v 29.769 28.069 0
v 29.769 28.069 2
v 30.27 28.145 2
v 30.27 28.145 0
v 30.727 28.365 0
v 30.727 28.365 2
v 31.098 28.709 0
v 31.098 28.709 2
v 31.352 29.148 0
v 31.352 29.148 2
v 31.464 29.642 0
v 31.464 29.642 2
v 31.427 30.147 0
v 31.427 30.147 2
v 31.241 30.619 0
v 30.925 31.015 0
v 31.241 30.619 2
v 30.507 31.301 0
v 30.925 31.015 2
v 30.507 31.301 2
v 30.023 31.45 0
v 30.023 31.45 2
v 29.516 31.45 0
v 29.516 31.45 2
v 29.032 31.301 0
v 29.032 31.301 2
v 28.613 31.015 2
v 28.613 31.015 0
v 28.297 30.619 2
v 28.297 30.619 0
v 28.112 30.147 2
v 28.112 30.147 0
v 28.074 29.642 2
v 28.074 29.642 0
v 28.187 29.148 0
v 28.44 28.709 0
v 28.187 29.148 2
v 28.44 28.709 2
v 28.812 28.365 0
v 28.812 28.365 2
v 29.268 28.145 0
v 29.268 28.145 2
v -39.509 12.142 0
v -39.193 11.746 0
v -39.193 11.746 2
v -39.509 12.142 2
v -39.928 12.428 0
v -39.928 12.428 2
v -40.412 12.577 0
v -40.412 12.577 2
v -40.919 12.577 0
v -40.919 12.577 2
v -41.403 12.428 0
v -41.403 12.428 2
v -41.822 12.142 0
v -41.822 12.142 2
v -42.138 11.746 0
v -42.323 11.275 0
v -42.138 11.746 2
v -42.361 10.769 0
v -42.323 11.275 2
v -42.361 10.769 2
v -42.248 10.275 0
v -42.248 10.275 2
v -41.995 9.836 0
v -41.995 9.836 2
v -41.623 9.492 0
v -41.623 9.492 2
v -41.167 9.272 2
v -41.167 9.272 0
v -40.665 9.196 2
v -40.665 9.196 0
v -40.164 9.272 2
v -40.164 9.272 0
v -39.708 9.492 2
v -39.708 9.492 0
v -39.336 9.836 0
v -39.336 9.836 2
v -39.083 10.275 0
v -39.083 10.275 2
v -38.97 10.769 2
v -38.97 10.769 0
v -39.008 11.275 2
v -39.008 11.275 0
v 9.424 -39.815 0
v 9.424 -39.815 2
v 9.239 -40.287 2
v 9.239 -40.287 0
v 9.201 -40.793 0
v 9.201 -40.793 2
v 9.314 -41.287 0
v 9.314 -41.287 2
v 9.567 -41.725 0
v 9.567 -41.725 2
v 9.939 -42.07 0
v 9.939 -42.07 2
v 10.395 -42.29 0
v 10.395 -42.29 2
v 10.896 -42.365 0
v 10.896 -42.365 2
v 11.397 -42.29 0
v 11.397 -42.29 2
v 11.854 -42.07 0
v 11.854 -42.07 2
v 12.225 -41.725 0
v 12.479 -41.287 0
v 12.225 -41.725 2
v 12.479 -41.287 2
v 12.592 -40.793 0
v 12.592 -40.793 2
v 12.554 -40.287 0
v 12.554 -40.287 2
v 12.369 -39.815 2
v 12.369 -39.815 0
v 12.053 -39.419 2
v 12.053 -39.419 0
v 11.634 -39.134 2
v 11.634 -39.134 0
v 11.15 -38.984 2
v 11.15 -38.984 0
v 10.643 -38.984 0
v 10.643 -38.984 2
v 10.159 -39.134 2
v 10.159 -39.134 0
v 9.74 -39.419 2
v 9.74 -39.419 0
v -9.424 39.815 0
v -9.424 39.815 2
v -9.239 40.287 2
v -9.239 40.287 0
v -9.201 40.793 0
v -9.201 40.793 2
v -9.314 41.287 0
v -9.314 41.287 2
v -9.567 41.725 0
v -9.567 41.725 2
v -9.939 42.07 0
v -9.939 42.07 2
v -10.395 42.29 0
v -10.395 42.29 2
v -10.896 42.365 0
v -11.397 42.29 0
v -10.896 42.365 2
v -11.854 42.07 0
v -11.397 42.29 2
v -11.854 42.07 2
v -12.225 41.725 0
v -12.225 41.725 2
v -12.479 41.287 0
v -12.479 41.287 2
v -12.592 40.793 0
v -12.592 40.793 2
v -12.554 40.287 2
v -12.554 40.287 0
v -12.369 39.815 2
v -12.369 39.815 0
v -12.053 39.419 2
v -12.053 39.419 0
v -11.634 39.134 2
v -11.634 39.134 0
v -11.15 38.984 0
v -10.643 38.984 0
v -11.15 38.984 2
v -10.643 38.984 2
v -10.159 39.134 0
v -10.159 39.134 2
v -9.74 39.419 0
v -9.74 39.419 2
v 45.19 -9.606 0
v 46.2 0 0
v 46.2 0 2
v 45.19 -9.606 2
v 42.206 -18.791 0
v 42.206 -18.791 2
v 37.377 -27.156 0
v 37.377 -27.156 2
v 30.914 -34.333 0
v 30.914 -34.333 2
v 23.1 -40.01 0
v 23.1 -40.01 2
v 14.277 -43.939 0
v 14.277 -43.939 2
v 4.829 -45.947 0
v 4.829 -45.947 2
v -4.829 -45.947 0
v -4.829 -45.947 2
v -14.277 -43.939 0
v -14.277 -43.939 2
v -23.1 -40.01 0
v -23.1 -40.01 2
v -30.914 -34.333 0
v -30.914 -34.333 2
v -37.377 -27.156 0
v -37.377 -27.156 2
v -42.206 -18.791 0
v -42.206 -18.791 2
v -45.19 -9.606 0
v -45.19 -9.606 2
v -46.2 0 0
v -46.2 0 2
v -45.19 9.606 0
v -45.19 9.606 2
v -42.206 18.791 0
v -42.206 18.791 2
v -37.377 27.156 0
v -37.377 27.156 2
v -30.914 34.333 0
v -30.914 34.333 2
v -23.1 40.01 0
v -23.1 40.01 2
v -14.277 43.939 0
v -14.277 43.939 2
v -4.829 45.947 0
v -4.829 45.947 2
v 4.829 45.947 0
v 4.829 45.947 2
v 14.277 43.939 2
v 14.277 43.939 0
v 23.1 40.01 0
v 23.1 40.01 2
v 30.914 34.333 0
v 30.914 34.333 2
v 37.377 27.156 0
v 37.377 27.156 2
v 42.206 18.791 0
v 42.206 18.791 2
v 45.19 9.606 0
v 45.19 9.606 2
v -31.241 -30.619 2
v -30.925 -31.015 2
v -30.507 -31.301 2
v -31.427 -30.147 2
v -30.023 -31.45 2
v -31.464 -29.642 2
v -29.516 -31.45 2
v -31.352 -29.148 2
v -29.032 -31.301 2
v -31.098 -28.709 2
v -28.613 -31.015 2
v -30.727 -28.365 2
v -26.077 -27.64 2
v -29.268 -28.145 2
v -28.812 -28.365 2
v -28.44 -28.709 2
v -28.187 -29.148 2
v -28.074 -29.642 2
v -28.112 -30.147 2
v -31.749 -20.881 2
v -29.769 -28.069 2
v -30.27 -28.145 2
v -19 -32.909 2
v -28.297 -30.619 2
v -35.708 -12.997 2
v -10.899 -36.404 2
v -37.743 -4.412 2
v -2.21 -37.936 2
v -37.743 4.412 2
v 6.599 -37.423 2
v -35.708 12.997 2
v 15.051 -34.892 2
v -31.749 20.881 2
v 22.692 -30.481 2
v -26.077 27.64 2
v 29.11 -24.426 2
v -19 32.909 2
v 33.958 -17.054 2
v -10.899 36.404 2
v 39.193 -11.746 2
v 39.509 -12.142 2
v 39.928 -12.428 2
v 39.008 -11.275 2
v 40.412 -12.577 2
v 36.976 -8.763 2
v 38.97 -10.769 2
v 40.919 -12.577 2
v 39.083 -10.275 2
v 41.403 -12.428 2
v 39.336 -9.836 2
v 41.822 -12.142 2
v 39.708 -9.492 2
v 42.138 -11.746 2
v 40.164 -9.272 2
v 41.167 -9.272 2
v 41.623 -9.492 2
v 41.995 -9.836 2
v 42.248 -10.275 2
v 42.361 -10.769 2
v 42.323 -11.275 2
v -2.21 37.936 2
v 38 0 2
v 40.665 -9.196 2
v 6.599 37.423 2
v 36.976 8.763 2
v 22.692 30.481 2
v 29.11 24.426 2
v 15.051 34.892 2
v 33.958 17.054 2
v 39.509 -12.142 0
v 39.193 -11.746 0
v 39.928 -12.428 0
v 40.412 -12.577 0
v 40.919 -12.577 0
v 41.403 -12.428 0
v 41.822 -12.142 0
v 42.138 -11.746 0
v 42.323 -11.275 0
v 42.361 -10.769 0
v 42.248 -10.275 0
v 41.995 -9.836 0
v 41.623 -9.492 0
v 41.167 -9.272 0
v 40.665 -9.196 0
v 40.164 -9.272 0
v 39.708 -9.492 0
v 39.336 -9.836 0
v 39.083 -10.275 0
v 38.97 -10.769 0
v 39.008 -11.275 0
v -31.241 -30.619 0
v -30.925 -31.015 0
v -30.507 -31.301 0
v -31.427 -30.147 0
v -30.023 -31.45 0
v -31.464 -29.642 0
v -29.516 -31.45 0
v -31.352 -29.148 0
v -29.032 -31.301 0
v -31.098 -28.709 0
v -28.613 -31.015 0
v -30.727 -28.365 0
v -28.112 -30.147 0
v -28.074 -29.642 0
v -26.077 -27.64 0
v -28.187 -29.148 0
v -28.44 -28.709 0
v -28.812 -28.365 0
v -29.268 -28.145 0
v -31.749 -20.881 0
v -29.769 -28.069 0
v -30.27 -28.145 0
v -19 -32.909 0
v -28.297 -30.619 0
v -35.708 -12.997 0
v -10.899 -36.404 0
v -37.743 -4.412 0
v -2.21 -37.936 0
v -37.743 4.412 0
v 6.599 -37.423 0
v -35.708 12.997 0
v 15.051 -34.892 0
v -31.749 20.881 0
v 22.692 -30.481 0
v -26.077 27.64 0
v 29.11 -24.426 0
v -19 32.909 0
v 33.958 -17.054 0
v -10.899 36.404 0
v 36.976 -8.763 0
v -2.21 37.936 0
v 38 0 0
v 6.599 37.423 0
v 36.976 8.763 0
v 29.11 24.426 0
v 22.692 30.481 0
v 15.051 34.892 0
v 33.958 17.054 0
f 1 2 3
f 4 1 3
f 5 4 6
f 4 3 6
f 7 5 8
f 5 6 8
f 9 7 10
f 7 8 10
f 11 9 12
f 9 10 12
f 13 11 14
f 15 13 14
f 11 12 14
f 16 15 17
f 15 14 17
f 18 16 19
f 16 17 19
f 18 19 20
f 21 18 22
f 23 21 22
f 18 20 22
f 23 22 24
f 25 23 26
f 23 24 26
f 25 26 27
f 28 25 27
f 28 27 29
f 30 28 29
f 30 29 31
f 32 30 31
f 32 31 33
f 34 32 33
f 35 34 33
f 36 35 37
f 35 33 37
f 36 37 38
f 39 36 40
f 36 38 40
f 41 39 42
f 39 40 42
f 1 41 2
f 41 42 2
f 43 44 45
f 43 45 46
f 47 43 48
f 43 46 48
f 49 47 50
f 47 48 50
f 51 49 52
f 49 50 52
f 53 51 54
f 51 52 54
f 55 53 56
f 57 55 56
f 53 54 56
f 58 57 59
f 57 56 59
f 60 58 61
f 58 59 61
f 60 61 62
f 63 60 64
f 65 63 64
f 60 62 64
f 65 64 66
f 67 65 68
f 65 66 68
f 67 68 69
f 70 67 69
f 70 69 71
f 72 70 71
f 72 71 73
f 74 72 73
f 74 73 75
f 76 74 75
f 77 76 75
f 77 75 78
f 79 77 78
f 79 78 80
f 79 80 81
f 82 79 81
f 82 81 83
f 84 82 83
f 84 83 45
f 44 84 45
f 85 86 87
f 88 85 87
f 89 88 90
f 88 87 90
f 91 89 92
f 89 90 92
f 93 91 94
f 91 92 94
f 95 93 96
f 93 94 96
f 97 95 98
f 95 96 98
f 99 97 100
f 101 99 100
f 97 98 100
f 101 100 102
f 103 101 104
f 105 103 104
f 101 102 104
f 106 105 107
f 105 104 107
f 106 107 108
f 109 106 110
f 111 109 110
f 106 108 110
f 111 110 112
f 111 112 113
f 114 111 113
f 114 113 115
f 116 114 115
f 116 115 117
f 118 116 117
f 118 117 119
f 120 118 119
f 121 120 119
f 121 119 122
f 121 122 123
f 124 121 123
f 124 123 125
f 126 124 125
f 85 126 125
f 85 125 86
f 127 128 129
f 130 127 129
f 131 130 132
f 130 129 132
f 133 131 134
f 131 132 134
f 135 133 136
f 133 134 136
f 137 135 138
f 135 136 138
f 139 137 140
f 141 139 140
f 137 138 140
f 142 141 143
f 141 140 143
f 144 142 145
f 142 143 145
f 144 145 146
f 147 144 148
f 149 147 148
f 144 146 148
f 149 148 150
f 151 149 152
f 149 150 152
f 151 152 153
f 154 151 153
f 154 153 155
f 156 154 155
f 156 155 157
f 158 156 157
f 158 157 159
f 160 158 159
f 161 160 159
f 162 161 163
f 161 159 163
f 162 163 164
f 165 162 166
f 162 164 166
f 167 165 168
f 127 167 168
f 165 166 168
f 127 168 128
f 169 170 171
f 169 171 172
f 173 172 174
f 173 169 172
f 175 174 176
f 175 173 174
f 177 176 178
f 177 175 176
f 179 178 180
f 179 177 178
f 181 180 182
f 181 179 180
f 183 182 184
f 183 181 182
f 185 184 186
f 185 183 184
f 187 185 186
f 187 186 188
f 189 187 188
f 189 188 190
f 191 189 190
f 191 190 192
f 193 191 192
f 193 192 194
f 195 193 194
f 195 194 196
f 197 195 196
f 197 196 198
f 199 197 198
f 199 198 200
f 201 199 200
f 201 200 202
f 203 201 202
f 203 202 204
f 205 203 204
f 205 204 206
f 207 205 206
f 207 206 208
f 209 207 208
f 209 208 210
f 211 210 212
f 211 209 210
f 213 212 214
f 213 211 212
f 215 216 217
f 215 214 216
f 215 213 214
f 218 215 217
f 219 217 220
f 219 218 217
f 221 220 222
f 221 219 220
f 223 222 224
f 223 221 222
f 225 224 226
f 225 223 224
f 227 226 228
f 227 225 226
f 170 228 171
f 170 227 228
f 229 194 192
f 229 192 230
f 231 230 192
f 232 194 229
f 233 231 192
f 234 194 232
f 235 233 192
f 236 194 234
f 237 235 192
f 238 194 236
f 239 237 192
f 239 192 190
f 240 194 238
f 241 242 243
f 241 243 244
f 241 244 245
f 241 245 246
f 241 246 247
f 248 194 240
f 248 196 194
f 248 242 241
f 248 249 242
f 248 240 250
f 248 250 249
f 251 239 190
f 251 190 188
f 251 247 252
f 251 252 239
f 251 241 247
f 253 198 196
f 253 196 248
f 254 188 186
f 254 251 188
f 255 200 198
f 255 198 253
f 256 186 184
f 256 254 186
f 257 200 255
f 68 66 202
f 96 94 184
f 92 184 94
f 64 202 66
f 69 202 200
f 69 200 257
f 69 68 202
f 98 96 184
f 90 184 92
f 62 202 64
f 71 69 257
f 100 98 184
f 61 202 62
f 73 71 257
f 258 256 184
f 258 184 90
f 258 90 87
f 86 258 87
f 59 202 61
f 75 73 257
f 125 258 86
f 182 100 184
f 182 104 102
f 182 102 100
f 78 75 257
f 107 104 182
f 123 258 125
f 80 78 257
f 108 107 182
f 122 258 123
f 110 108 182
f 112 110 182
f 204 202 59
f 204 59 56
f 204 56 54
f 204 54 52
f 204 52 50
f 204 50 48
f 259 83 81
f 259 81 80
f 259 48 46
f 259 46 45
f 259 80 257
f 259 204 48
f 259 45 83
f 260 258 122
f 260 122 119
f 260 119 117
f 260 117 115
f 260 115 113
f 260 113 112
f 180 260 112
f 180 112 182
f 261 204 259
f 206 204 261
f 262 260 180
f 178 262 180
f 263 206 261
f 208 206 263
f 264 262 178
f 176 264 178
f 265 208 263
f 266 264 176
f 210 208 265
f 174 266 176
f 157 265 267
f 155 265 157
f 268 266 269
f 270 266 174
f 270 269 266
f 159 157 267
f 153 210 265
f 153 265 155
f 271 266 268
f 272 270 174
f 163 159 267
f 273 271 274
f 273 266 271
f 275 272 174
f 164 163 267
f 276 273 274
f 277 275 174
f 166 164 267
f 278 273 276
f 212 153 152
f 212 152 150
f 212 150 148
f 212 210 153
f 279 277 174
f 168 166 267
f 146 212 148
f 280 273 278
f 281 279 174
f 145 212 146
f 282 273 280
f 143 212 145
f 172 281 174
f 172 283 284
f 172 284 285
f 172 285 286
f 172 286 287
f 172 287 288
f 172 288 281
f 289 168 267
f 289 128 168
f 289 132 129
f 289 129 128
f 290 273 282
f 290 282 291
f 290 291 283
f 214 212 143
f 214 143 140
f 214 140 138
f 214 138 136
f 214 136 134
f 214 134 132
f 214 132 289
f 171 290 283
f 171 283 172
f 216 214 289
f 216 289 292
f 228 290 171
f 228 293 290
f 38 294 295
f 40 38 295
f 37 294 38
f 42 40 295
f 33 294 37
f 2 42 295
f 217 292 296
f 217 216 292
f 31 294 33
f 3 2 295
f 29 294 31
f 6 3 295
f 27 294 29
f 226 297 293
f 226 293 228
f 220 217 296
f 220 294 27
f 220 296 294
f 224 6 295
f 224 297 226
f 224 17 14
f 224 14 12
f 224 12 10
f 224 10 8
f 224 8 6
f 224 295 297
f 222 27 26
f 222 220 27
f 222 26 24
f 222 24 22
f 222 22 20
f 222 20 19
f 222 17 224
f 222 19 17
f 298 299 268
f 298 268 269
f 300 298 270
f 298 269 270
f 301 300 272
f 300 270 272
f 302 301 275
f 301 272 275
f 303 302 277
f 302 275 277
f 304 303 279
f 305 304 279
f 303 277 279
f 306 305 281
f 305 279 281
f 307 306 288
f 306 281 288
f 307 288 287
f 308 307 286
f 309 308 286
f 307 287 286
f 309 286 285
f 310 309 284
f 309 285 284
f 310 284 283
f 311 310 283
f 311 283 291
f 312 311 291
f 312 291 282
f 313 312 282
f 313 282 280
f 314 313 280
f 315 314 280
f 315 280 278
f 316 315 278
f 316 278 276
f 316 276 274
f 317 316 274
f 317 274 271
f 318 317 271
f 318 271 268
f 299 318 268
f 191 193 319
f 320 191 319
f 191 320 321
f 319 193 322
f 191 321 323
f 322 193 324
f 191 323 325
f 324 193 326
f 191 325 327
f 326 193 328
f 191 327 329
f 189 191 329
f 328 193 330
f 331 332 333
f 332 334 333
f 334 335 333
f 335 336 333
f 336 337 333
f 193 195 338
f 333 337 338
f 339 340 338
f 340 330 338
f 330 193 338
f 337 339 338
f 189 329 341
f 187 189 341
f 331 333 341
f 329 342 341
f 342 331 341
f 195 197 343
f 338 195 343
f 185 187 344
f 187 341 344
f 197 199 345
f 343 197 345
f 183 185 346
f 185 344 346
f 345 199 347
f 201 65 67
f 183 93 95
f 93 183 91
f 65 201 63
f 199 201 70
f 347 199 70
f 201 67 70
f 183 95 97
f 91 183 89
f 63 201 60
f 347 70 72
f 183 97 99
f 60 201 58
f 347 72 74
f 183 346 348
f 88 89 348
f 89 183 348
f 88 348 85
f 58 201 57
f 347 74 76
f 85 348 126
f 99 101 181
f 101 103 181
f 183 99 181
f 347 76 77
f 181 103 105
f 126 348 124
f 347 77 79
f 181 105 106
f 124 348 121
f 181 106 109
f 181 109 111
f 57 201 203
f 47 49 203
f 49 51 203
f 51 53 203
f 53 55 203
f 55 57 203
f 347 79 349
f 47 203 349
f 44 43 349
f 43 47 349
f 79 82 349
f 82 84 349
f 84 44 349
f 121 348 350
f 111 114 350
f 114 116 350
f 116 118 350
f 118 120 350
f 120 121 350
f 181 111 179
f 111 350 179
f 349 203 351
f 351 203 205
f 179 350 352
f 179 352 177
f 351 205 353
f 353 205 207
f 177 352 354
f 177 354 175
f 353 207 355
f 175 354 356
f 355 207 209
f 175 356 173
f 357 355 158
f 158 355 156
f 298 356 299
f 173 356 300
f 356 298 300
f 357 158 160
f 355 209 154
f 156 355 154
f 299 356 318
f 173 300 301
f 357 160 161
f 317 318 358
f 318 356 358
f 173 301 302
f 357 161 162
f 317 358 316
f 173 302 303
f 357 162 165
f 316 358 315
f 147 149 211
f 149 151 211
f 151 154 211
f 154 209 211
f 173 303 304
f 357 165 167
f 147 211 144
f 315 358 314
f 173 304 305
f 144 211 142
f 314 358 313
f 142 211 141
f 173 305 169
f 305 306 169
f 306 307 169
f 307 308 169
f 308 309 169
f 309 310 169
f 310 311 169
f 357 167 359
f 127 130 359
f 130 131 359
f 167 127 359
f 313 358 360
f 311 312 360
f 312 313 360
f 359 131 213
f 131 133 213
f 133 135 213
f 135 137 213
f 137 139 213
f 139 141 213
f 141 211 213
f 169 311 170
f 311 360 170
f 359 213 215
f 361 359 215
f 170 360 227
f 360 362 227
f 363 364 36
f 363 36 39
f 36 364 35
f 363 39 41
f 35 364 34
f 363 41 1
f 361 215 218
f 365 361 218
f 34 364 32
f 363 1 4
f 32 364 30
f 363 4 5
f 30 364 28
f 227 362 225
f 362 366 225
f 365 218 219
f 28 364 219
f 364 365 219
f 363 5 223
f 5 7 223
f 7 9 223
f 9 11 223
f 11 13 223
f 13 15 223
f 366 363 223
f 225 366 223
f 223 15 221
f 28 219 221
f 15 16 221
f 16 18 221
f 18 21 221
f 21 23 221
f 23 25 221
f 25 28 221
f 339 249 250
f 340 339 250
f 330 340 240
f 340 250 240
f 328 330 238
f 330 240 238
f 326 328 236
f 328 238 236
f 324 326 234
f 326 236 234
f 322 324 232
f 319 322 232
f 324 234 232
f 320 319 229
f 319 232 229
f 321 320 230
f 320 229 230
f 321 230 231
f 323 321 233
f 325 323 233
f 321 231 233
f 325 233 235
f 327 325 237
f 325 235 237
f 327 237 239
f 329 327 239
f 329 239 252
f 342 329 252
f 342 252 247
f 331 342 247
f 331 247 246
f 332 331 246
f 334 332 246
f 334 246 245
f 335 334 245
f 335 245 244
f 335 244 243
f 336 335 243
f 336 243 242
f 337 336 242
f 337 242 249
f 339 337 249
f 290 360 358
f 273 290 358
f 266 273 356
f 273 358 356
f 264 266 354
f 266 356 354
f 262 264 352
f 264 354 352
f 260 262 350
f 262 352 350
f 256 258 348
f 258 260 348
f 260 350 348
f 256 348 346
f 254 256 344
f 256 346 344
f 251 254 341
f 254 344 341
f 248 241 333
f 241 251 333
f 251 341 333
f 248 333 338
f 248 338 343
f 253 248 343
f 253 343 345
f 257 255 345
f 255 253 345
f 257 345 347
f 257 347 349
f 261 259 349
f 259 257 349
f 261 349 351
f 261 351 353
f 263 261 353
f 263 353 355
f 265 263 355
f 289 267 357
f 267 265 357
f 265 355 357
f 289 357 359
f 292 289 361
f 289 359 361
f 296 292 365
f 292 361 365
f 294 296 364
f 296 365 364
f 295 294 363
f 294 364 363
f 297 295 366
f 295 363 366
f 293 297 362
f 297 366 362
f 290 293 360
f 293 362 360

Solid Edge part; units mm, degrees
sketch "Sketch1" plane through (0, 0, 0) normal (0, 0, 1) x (1, 0, 0)
  circle A0 centre (0, 0) radius 38
  circle A1 centre (0, 0) radius 46.2
extrude "Protrusion1" add sketch "Sketch1" along normal blind 2
hole "Hole1" at (29.7692, 29.7692, 2) direction (0, 0, -1) diameter 3.4 end up to next
pattern_circular "Pattern1" count 6 over 360 about axis through (0, 0, 2) along (0, 0, -1) of "Hole1"
